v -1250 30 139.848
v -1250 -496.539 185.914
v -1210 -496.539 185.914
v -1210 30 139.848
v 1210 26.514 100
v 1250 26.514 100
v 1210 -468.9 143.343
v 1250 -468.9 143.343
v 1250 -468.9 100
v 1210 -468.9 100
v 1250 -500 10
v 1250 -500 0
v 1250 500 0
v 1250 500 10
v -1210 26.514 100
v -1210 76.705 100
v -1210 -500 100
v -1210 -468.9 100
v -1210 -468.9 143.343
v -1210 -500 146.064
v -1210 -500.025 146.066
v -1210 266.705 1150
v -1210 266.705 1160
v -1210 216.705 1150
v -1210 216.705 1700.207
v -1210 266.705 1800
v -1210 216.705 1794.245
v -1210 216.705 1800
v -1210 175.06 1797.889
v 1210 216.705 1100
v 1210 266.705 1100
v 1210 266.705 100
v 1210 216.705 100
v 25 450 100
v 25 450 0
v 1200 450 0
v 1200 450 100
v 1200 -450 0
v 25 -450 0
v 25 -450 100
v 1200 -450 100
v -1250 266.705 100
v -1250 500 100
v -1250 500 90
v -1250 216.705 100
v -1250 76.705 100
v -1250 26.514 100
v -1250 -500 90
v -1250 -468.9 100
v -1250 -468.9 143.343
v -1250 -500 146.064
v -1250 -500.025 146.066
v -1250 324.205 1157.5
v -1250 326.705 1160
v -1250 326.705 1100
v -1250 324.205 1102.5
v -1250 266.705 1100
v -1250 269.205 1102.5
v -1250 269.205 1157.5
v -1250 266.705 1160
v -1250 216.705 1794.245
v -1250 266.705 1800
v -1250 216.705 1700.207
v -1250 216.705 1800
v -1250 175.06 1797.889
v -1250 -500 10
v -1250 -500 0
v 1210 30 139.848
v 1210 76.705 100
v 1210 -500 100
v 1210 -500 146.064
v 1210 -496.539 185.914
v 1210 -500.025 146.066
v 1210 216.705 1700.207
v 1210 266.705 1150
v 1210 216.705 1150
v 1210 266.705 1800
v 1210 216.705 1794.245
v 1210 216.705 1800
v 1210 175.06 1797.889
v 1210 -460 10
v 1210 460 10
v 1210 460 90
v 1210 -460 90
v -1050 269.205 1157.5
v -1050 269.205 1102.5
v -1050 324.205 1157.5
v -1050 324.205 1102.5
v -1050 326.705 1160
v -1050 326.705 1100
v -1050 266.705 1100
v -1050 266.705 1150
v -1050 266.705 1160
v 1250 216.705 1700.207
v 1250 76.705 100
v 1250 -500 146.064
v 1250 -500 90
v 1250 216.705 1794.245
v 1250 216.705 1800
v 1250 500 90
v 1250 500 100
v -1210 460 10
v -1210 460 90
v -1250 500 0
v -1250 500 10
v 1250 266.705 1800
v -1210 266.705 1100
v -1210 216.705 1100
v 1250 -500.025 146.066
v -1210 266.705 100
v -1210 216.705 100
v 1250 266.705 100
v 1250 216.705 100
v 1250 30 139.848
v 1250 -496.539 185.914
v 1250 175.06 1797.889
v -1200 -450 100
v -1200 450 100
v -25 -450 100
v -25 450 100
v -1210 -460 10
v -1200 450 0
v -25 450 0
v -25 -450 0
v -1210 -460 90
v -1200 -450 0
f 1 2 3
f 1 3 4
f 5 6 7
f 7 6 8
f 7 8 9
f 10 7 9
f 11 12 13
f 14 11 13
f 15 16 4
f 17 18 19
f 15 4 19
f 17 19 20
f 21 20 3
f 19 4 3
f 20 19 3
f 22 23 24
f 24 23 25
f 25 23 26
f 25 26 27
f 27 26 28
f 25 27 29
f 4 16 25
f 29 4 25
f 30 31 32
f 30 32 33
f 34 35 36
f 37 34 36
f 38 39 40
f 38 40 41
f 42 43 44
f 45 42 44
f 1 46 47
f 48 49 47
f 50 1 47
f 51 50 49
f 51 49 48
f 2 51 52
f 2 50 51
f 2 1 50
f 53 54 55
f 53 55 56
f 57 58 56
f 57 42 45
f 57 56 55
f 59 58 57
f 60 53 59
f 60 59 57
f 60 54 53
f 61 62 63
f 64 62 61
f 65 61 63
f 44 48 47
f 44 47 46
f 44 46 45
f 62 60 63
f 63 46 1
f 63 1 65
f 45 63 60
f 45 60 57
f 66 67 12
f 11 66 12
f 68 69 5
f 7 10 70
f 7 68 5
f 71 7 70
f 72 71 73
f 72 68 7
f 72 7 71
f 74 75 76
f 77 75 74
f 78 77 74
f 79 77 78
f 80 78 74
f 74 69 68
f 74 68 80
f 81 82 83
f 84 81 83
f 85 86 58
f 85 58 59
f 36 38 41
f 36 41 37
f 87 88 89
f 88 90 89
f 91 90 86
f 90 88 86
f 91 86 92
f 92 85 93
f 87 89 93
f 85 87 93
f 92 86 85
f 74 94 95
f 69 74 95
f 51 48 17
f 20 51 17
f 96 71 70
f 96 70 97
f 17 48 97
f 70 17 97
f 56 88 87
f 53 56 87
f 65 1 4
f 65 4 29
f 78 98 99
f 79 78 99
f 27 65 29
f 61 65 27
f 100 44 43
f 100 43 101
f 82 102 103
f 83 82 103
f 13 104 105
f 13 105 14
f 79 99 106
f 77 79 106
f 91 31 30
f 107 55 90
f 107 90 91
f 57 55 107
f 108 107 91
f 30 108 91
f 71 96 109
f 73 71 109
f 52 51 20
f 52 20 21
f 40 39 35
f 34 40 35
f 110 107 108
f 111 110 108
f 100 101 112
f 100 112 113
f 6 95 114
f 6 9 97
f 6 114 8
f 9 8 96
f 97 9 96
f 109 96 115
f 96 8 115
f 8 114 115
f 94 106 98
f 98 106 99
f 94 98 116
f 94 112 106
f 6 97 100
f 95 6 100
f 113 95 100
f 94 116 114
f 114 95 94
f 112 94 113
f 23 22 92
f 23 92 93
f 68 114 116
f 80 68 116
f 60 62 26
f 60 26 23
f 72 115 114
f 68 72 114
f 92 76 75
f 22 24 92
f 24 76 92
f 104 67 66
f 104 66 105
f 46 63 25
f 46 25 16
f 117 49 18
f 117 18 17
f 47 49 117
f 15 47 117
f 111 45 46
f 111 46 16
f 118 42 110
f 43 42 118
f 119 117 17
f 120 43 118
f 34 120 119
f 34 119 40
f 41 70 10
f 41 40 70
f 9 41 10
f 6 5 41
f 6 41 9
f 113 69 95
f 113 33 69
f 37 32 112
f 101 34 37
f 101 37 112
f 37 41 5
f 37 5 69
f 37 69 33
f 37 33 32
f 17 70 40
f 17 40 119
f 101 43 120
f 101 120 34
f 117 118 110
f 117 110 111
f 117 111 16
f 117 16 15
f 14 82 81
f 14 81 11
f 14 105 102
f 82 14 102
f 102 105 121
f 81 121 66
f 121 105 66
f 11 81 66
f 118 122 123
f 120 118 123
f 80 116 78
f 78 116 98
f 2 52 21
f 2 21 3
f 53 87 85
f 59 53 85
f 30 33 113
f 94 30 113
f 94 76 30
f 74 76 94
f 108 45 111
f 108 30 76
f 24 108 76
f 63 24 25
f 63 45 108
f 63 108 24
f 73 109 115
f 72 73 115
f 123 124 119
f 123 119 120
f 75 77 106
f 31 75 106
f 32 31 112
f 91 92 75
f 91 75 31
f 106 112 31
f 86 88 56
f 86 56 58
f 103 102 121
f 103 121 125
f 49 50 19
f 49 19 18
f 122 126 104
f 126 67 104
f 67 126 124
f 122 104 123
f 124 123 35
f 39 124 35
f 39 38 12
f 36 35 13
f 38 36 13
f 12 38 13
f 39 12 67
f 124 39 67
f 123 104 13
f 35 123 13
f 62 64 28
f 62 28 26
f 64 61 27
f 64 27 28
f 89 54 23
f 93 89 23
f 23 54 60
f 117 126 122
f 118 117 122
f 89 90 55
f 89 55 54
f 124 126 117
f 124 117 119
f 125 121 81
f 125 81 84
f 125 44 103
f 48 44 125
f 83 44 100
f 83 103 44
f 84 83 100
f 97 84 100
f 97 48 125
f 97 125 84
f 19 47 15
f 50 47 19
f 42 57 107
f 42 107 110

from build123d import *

# Parameters (mm, degrees)
F0_W          = 2500
F0_H          = 1000
F0_W_2        = 1175
F0_H_2        = 900
F1_DEPTH      = 100
F2_W          = 40
F2_H          = 80
F3_DEPTH      = 2500.001
F4_W          = 40
F4_H          = 80
F5_DEPTH      = 960.001
F6_W          = 90
F6_H          = 80
F7_DEPTH      = 450
F7_DEPTH_BACK = 450
F9_DEPTH      = 40
F11_W         = 50
F11_H         = 50
F12_DEPTH     = 2420
F13_W         = 60
F13_H         = 60
F13_W_2       = 55
F13_H_2       = 55
F14_DEPTH     = 200


# Not quite as in the source:
# - a feature names something its author has since deleted; it is built from what else it names


with BuildPart() as f1:
    # F0 (on Top) → F1 (new body)
    with BuildSketch(Plane.XY):
        Rectangle(F0_W, F0_H)
        with Locations((-612.5, 0)):
            Rectangle(F0_W_2, F0_H_2, mode=Mode.SUBTRACT)
        with Locations((612.5, 0)):
            Rectangle(F0_W_2, F0_H_2, mode=Mode.SUBTRACT)
    extrude(amount=F1_DEPTH)

    # F2 (on face) → F3 (cut, through all)
    with BuildSketch(Plane(origin=(-1250, 0, 0), x_dir=(0, -1, 0), z_dir=(-1, 0, 0))):
        with Locations((-480, 50)):
            Rectangle(F2_W, F2_H)
        with Locations((480, 50)):
            Rectangle(F2_W, F2_H)
    extrude(amount=-F3_DEPTH, mode=Mode.SUBTRACT)

    # F4 (on face) → F5 (cut, through all)
    with BuildSketch(Plane.XZ.offset(460)):
        with Locations((1230, 50)):
            Rectangle(F4_W, F4_H)
        with Locations((-1230, 50)):
            Rectangle(F4_W, F4_H)
    extrude(amount=-F5_DEPTH, mode=Mode.SUBTRACT)

    # F6 (on Front) → F7 (cut, two sides)
    with BuildSketch(Plane.XZ) as f7_sk:
        with Locations((-45, 50)):
            Rectangle(F6_W, F6_H)
    extrude(amount=-F7_DEPTH, mode=Mode.SUBTRACT)
    extrude(f7_sk.sketch, amount=F7_DEPTH_BACK, mode=Mode.SUBTRACT)

    # F8 (on face) → F9 (join)
    with BuildSketch(Plane(origin=(-1250, 0, 0), x_dir=(0, -1, 0), z_dir=(-1, 0, 0))):
        Polygon((-216.7047621673, 1700.2073223866), (-76.7047621673, 100), (-26.5137702901, 100), (-30, 139.8477879237), (-175.0597899337, 1797.8887738934), (-216.7047621673, 1794.2453109301), align=None)
        Polygon((-224.8695248383, 1793.530986756), (-216.7047621673, 1700.2073223866), (-216.7047621673, 1794.2453109301), align=None)
        Polygon((-30, 139.8477879237), (-26.5137702901, 100), (468.9004319267, 143.3431264437), (500, 146.0639860907), (500.0249770351, 146.0661712981), (496.5387473252, 185.9139592218), align=None)
        Polygon((500, 146.0639860907), (468.9004319267, 143.3431264437), (468.9004319267, 100), (500, 100), align=None)
        Polygon((-216.7047621673, 100), (-216.7047621673, 1700.2073223866), (-224.8695248383, 1793.530986756), (-216.7047621673, 1794.2453109301), (-216.7047621673, 1800), (-266.7047621673, 1800), (-266.7047621673, 100), align=None)
    extrude(amount=-F9_DEPTH)

    # F10: F1 across plane


with BuildPart() as f1_1:
    add(f1.part)
    add(f1.part.mirror(Plane.YZ))

    # F11 (on face) → F12 (join, through all)
    with BuildSketch(Plane.YZ.offset(-1210)):
        with Locations((241.7047621673, 1125)):
            Rectangle(F11_W, F11_H)
    extrude(amount=F12_DEPTH)

    # F13 (on face) → F14 (join)
    with BuildSketch(Plane(origin=(-1250, 0, 0), x_dir=(0, -1, 0), z_dir=(-1, 0, 0))):
        with Locations((-296.7047621673, 1130)):
            Rectangle(F13_W, F13_H)
        with Locations((-296.7047621673, 1130)):
            Rectangle(F13_W_2, F13_H_2, mode=Mode.SUBTRACT)
    extrude(amount=-F14_DEPTH)


solid = f1_1.part
